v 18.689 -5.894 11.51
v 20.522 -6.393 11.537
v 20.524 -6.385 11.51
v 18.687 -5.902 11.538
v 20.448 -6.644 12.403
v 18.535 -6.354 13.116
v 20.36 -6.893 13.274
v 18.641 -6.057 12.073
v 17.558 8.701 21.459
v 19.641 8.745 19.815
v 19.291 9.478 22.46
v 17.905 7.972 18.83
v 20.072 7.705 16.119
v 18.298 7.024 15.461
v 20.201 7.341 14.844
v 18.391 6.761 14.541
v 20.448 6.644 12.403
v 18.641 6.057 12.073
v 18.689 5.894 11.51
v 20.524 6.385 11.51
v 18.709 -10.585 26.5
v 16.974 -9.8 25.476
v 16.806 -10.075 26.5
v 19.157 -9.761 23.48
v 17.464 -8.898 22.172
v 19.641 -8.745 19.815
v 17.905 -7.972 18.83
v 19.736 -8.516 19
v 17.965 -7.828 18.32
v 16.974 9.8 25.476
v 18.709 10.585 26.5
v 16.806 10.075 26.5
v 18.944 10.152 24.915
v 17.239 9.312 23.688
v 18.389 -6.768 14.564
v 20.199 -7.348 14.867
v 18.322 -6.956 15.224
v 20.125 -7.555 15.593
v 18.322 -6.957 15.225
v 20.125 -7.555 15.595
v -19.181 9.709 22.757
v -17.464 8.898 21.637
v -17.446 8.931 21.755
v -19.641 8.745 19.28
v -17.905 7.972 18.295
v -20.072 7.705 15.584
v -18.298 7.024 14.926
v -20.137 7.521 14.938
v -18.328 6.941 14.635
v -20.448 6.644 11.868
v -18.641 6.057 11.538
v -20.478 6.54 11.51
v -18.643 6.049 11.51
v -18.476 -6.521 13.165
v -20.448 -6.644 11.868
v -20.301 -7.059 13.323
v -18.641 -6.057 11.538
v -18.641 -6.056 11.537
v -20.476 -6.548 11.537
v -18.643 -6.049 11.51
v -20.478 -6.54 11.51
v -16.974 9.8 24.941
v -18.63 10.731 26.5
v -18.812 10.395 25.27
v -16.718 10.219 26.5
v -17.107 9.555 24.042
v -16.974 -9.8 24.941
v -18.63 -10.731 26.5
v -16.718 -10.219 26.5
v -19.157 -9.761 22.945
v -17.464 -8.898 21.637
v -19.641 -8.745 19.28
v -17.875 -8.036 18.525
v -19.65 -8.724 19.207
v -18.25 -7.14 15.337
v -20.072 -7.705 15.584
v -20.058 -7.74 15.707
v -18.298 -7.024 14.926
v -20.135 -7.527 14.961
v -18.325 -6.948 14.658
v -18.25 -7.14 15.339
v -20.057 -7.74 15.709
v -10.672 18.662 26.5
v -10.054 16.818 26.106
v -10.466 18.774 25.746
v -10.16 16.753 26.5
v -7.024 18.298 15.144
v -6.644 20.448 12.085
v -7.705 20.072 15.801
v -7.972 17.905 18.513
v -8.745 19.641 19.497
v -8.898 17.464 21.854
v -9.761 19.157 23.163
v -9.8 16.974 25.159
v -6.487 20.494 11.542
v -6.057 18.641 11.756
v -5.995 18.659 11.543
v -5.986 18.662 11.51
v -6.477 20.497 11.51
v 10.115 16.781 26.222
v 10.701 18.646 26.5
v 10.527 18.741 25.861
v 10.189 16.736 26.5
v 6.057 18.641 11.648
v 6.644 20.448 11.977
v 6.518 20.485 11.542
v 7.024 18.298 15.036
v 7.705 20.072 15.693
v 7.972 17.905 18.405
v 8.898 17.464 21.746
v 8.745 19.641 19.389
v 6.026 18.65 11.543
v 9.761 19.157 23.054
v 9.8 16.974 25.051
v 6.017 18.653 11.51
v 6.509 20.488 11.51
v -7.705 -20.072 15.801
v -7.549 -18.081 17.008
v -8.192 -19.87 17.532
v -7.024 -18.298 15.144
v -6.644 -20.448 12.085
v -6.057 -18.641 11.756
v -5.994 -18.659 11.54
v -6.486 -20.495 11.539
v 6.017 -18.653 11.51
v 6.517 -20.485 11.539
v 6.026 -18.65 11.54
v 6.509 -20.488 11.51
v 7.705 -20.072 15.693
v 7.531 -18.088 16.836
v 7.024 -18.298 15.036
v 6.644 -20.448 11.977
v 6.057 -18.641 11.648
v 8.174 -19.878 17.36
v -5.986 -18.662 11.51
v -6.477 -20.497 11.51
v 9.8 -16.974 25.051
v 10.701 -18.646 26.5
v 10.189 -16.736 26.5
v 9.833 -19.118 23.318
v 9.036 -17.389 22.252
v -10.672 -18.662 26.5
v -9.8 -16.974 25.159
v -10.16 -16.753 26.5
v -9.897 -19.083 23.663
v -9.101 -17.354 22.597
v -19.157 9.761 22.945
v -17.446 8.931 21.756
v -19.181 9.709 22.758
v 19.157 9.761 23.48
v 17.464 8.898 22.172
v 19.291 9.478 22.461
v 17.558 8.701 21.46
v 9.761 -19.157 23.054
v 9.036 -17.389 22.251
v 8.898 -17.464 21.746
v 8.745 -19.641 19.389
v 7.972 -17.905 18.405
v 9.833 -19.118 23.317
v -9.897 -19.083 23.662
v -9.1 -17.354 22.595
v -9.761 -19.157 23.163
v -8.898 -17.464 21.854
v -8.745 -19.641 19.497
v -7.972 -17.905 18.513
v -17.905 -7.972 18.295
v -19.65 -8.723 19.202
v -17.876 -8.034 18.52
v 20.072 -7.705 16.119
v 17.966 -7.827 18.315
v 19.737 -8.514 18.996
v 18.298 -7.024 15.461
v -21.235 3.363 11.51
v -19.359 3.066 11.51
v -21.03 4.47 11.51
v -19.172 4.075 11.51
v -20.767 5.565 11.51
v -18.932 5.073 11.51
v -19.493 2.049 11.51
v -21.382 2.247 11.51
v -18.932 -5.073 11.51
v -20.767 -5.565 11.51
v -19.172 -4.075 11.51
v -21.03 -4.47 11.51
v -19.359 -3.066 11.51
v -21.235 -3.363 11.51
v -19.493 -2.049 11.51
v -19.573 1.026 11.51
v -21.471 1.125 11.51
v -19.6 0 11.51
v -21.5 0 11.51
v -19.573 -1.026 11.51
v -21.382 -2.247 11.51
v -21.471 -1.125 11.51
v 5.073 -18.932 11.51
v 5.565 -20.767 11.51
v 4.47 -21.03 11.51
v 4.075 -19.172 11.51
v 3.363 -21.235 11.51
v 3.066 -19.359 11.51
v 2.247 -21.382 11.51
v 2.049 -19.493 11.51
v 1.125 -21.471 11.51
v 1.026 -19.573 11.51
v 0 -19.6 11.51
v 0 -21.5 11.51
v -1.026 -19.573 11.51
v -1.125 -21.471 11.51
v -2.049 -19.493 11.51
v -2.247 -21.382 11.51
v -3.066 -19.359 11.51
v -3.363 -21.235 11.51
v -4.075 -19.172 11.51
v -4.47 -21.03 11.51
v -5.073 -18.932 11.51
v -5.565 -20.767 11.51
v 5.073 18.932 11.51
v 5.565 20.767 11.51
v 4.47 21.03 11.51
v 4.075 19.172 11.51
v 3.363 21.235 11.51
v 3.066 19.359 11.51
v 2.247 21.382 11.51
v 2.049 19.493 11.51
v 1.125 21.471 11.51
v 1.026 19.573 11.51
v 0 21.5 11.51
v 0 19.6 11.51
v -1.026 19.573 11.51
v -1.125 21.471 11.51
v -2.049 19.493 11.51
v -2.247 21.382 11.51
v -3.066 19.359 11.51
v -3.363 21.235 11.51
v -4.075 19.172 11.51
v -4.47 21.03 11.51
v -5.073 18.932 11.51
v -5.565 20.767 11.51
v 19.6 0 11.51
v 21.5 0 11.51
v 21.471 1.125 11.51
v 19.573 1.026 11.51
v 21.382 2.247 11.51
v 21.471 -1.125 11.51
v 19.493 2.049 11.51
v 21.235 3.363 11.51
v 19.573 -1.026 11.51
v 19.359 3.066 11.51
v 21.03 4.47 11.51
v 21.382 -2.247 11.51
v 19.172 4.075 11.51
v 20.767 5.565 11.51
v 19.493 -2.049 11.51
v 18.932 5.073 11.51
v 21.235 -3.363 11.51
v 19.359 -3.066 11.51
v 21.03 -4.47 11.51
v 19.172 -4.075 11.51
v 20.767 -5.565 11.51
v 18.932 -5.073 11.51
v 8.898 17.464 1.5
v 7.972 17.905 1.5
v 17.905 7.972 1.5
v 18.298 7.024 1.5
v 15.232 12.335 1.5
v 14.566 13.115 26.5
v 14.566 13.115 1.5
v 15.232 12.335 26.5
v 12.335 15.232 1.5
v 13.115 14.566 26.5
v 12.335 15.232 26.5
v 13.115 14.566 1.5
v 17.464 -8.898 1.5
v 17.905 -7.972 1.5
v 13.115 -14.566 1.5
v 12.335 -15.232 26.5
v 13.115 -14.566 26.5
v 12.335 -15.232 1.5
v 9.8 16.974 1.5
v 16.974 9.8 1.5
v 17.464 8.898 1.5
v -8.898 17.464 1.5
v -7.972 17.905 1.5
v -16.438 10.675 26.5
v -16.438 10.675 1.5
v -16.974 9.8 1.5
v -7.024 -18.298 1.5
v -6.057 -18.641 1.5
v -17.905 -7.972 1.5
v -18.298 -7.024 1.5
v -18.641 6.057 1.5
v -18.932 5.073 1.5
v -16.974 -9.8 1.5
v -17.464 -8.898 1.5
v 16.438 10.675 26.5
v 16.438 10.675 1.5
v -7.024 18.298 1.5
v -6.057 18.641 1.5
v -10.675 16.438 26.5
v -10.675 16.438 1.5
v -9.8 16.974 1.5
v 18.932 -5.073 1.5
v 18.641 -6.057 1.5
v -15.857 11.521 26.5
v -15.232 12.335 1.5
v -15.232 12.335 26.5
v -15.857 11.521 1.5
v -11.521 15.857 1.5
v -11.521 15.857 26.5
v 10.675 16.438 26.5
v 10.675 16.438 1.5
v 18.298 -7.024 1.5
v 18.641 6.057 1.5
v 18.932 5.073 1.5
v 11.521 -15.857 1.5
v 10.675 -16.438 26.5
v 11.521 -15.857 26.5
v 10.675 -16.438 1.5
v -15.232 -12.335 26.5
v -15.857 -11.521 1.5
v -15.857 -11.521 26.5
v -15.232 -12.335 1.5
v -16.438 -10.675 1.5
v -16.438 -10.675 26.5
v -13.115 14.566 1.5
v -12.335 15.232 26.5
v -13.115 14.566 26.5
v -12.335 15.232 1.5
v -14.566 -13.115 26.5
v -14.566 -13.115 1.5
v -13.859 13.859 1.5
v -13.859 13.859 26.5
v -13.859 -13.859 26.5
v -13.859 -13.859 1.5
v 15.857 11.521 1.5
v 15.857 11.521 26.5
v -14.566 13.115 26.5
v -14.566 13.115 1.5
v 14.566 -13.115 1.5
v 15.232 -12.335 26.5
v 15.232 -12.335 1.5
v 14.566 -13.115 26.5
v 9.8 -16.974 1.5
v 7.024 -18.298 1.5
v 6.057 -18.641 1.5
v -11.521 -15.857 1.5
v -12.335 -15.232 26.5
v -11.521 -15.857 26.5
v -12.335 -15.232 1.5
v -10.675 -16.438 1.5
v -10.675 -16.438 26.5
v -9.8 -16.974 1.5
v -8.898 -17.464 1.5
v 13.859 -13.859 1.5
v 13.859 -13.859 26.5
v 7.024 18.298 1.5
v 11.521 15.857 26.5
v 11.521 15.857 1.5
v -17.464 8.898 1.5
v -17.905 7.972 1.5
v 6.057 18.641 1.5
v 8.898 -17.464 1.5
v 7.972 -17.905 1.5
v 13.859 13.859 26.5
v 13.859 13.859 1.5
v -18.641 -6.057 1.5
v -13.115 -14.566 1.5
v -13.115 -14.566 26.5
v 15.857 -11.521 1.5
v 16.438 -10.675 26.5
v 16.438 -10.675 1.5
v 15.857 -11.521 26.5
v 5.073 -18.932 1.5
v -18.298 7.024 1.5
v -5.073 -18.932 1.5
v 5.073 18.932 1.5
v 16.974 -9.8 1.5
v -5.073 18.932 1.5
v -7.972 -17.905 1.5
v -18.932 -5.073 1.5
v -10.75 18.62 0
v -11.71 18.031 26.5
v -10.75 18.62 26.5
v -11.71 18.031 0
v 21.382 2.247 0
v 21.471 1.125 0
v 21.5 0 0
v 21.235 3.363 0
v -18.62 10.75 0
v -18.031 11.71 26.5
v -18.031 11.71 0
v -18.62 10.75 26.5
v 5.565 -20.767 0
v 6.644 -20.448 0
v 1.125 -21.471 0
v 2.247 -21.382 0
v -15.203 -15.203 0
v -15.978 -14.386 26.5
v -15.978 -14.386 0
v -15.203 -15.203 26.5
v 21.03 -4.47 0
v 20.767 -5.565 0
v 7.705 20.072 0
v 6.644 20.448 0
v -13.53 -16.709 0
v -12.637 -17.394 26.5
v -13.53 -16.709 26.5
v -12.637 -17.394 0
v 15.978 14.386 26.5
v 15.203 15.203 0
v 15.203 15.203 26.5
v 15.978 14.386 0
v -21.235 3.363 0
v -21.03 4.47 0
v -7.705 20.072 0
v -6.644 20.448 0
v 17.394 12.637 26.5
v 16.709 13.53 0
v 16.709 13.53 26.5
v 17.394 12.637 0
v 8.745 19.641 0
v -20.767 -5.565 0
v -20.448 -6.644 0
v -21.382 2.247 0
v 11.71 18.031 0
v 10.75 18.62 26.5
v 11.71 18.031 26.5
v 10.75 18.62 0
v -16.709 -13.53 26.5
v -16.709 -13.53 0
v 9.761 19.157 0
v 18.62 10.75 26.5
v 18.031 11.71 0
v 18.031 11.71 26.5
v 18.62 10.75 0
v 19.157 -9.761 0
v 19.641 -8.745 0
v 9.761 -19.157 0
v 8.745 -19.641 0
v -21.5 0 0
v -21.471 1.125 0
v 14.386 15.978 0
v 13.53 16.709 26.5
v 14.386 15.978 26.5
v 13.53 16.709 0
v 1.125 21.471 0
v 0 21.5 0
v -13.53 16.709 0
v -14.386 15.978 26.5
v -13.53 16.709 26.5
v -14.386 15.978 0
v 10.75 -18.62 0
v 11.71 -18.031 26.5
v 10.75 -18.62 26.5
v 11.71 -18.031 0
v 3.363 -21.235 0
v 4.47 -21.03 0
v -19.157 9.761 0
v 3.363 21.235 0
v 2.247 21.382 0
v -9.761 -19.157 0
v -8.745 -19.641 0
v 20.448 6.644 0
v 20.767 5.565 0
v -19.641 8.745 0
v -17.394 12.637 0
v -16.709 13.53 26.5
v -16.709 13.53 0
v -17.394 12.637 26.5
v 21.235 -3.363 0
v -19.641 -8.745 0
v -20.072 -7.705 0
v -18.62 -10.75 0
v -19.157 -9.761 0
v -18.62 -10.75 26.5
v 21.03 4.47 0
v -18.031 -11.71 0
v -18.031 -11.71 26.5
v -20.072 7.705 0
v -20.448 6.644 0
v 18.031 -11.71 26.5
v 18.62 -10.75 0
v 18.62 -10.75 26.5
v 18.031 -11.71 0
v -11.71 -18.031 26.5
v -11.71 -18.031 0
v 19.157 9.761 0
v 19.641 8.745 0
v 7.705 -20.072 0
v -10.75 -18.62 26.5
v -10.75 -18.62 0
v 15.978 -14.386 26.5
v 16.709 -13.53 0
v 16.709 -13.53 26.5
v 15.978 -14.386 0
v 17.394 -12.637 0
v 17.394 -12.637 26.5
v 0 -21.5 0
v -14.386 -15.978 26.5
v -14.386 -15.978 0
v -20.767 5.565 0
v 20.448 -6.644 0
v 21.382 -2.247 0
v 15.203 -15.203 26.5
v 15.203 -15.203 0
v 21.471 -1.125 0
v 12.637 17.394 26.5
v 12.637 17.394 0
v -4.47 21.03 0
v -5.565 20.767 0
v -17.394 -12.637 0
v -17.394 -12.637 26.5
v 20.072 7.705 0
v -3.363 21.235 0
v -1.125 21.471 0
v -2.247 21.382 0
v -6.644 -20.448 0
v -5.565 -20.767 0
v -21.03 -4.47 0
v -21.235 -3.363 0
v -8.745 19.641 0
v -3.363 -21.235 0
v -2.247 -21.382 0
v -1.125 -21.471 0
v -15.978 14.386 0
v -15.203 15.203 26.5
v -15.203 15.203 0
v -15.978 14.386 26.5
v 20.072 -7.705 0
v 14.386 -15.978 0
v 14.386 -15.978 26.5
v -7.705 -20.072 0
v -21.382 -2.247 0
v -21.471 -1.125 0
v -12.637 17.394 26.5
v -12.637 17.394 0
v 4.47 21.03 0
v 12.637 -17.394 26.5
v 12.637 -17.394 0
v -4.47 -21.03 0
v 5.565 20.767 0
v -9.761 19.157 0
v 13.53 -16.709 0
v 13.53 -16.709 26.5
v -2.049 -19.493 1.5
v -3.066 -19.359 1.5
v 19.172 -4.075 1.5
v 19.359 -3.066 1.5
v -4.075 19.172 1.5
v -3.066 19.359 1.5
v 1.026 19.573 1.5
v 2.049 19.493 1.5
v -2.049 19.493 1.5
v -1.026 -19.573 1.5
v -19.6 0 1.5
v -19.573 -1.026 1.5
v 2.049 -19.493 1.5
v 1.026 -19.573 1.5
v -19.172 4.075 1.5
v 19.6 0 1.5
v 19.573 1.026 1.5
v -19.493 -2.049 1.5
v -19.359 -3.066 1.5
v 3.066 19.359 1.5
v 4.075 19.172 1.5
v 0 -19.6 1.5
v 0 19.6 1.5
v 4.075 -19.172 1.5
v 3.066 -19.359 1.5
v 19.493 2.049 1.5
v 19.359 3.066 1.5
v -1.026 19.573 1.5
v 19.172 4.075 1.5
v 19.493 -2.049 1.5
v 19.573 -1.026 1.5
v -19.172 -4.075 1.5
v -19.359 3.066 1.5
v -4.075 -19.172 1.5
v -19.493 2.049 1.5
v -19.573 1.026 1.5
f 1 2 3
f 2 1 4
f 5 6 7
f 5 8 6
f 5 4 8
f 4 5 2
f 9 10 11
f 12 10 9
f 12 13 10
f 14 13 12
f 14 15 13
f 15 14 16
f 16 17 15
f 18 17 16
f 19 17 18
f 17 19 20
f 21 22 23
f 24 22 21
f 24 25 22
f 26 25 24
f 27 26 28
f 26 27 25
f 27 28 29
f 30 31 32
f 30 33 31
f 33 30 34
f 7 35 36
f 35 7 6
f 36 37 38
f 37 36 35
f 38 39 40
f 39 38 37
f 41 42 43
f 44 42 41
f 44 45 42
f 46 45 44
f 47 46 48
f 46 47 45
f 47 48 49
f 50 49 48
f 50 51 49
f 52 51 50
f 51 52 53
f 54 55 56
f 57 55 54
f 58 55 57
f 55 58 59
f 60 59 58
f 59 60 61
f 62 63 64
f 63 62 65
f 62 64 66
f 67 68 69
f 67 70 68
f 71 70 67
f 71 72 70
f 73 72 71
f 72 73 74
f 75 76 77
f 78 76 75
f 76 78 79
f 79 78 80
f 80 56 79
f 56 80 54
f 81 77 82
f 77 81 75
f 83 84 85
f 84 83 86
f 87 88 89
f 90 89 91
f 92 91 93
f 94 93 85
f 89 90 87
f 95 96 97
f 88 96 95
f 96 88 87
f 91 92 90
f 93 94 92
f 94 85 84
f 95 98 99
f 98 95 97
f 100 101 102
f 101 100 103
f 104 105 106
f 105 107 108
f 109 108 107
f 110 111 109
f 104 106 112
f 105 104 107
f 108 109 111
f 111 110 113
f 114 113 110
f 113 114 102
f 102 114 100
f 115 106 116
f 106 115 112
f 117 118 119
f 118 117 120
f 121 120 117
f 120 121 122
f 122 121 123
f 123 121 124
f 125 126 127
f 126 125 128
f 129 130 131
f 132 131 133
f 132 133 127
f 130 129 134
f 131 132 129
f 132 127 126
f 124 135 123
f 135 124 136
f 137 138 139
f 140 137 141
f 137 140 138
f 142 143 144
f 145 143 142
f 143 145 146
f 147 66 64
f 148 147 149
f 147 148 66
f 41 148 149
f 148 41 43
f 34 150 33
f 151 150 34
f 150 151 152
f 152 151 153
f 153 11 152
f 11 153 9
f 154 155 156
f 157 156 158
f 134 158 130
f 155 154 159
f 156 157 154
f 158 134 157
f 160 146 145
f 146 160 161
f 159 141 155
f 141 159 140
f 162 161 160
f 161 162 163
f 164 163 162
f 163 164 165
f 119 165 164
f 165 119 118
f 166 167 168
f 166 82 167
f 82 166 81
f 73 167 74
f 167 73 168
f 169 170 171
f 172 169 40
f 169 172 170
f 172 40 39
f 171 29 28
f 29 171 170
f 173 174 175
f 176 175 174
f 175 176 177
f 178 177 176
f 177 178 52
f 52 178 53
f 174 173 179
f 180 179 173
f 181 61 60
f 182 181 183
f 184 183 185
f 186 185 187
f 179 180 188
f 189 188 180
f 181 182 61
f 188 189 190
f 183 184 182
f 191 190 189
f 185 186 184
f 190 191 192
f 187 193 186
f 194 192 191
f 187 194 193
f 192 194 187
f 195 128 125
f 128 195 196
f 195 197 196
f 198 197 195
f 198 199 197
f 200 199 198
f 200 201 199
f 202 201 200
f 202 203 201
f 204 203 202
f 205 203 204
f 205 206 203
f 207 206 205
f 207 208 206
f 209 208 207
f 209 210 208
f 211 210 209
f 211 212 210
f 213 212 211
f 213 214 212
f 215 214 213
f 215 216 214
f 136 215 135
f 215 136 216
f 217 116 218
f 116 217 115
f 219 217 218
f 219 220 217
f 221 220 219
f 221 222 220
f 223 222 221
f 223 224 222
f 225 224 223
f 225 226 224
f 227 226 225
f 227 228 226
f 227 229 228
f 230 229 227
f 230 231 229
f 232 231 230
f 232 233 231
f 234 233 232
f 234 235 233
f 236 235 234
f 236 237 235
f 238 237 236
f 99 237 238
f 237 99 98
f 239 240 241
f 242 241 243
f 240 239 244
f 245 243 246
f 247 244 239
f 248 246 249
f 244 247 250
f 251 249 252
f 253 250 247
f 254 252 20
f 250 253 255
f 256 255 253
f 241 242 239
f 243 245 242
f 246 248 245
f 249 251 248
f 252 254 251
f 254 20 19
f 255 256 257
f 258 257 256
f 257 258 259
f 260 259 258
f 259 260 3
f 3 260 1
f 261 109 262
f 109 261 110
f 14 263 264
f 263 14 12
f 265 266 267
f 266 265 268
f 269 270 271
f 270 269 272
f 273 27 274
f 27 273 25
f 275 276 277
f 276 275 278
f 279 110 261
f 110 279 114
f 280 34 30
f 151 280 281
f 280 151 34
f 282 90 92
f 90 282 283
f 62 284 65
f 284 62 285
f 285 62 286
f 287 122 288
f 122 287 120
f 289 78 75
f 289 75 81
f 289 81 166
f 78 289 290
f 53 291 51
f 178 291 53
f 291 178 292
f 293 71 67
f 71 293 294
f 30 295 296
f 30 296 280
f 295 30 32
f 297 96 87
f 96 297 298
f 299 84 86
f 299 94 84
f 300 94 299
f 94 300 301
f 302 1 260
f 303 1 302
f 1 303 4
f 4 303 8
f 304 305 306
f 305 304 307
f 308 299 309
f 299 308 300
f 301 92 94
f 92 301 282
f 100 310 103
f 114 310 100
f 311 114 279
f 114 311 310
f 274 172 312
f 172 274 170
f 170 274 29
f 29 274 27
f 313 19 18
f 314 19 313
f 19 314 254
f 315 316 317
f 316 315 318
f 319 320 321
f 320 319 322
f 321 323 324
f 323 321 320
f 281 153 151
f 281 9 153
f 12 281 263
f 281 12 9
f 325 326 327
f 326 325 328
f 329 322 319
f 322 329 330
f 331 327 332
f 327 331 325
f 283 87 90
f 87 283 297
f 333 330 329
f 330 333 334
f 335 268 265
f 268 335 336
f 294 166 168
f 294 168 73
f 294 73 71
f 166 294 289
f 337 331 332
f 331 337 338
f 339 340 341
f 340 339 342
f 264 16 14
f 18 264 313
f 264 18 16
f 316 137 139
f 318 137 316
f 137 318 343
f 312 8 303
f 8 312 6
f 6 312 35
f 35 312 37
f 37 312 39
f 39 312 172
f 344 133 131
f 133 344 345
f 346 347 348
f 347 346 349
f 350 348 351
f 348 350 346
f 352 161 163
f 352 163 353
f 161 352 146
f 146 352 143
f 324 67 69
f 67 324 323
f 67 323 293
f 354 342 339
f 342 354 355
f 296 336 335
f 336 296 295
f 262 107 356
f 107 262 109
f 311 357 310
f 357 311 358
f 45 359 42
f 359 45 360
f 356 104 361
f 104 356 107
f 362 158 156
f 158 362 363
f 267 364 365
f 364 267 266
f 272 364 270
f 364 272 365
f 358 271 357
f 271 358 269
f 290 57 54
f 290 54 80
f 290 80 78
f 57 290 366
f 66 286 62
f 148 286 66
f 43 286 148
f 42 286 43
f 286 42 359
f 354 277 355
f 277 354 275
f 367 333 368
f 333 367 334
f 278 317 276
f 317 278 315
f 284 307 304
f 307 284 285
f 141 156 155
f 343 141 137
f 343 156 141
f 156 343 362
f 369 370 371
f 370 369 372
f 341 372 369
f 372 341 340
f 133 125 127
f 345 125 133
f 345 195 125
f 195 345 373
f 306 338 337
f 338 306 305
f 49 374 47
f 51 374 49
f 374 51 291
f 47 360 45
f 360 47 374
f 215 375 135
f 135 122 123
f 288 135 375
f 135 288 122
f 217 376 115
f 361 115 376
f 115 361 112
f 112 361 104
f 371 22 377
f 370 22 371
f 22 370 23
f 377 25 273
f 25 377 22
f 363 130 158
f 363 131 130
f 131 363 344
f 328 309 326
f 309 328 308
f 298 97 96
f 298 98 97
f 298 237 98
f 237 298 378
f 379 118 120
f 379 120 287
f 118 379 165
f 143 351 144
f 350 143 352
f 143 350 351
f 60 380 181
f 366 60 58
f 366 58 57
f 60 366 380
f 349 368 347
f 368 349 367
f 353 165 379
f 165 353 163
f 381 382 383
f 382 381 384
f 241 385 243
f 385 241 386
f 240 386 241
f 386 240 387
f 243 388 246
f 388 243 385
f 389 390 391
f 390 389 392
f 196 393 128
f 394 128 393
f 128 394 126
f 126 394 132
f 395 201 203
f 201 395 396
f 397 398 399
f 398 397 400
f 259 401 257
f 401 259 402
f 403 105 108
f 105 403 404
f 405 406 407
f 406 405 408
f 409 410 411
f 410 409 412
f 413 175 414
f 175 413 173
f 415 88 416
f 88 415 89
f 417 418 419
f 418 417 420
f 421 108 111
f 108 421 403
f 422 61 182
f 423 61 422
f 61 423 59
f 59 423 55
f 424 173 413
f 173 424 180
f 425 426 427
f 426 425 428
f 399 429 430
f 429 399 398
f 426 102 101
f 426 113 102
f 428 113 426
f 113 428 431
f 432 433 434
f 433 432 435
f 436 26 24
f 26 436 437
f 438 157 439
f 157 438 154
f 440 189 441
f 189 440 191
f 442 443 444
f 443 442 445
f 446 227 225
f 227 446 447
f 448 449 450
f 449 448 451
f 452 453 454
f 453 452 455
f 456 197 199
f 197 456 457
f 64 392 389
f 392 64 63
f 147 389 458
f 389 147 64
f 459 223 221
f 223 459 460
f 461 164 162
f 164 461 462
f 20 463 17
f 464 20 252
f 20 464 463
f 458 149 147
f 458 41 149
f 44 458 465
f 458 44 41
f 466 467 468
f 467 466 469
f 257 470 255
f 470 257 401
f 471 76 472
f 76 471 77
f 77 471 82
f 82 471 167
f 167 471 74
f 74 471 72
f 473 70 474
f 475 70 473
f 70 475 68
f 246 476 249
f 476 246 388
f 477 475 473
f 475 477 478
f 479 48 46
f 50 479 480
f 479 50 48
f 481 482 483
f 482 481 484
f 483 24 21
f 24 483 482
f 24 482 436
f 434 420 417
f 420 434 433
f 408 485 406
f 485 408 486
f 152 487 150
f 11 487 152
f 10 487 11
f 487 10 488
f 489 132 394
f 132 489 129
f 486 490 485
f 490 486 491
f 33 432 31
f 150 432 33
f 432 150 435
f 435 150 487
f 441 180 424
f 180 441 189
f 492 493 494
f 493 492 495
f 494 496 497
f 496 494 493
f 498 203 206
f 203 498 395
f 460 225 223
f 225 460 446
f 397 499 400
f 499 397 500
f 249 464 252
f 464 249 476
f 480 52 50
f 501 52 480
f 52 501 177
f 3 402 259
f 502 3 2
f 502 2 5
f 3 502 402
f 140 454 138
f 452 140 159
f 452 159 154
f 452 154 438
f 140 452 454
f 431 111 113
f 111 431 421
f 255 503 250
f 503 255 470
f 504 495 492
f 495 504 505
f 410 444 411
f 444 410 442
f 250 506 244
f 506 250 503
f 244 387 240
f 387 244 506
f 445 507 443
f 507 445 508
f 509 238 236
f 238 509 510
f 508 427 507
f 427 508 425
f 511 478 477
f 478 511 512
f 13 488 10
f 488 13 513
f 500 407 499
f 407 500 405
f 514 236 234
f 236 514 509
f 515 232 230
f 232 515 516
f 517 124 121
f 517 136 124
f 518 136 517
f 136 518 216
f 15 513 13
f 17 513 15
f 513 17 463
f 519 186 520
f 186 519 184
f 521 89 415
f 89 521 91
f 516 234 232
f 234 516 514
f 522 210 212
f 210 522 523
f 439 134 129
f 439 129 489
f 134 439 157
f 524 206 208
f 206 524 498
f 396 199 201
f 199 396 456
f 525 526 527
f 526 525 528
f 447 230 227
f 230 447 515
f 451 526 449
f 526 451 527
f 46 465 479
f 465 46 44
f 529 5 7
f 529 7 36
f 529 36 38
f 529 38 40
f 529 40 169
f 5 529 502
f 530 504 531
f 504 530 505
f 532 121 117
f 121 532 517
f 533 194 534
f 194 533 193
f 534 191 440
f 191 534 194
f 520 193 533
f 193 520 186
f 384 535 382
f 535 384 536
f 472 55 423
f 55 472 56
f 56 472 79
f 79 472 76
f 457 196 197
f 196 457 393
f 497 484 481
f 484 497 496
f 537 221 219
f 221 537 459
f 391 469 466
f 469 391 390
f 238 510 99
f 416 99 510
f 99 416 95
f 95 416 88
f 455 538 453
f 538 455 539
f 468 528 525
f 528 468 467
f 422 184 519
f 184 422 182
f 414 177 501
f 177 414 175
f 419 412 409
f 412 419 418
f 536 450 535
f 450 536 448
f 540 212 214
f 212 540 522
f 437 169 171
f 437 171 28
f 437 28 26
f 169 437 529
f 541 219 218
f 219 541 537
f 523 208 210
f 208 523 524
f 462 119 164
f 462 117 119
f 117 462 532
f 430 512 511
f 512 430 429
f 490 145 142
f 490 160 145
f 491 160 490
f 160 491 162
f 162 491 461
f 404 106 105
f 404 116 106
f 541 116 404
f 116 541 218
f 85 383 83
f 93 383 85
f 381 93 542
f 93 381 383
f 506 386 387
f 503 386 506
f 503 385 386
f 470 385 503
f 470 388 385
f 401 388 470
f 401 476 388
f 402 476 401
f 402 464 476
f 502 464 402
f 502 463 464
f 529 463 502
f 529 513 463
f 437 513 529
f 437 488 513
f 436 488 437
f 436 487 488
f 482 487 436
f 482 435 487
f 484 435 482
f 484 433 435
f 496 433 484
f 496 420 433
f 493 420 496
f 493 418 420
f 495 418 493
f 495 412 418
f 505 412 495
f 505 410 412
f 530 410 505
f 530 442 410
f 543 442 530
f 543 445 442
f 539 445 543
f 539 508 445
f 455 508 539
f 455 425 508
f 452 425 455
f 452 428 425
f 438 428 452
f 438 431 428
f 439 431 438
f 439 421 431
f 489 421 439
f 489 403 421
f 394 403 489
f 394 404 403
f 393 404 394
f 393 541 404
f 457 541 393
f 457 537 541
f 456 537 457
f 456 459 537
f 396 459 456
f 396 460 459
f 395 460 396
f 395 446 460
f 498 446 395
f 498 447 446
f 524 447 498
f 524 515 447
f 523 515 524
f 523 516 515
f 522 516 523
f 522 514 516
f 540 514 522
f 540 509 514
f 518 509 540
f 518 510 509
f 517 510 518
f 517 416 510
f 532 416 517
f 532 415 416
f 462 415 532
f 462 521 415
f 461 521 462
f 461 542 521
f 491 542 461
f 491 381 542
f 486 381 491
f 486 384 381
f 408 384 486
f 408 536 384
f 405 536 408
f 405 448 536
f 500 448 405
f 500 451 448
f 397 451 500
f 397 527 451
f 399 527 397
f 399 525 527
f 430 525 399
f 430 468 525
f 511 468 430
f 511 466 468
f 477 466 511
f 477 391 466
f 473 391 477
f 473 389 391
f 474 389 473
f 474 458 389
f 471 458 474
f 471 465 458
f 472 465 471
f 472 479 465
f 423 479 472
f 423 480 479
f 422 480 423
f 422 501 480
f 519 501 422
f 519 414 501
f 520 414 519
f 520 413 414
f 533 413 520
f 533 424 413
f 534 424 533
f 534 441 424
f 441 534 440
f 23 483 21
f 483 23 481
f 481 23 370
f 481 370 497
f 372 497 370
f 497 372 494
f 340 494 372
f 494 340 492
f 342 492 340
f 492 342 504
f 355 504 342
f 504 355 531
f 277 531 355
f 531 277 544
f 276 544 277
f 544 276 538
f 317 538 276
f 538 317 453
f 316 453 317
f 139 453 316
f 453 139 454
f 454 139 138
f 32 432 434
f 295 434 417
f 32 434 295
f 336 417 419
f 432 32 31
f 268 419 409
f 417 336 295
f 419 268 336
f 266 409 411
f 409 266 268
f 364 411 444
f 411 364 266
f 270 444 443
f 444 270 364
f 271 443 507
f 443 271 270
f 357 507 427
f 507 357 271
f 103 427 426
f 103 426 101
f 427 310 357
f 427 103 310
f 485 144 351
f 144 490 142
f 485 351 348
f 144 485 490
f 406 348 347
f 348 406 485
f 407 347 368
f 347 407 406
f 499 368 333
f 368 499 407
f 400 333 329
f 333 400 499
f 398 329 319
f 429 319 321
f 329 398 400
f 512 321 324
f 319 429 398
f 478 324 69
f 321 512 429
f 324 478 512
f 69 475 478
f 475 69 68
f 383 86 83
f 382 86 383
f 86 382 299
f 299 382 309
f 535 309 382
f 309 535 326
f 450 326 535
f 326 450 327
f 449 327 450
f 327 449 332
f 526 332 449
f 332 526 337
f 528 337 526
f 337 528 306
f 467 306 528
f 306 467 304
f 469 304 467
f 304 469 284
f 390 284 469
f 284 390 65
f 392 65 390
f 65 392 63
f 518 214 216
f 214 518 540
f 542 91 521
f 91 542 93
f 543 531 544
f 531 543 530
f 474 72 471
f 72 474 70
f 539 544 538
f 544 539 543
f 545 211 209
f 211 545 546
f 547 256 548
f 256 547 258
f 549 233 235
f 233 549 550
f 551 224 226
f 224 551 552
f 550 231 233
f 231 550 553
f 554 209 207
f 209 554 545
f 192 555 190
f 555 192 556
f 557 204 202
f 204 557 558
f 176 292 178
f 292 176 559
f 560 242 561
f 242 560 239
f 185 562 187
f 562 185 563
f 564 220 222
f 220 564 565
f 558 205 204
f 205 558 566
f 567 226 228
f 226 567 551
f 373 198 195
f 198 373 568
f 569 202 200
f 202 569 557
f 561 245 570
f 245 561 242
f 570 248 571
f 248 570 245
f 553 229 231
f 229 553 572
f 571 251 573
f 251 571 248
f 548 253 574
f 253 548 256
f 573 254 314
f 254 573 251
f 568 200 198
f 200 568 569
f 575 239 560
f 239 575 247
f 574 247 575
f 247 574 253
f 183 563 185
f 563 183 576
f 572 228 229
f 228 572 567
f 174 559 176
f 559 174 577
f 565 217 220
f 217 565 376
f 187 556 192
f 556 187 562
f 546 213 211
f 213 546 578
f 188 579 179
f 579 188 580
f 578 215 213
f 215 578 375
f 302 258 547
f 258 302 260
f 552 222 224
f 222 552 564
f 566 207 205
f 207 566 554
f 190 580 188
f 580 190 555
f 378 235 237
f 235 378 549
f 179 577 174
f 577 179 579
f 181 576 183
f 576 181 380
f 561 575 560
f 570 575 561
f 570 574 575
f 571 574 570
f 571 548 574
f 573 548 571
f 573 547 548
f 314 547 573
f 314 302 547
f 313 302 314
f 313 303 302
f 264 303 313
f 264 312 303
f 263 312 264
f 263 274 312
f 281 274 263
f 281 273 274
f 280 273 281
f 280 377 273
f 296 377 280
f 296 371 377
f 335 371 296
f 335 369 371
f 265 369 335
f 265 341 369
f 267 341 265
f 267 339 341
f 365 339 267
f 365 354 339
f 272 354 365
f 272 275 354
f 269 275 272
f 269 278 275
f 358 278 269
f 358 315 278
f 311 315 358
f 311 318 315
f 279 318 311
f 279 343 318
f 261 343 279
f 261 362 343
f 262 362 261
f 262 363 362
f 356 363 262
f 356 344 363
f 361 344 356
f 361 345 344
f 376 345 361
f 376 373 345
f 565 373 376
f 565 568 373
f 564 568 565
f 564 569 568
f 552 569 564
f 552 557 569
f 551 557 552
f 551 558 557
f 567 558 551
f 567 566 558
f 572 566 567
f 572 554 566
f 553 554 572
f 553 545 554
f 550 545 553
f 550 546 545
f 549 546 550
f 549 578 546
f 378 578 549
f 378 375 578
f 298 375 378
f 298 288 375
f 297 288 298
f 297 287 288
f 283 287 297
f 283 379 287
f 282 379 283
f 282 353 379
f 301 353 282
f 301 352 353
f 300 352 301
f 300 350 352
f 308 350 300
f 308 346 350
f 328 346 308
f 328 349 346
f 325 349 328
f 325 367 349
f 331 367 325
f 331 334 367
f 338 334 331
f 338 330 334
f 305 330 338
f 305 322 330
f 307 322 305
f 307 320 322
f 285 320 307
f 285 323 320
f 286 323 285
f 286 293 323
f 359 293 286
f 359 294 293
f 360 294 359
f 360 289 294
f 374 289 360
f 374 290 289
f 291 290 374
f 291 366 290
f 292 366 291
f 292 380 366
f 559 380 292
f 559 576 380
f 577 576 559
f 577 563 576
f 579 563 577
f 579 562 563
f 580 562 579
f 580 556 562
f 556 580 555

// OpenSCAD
// file: shave.scad
// Shave stick holder common code

// Copyright (C) 2023 Embecosm Limited (www.embecosm.com)

// Contributor: Jeremy Bennett <jeremy.bennett@embecosm.com>

// This file is licensed under the Creative Commons Attribution-ShareAlike 3.0
// Unported License. To view a copy of this license, visit
// http://creativecommons.org/licenses/by-sa/3.0/ or send a letter to Creative
// Commons, PO Box 1866, Mountain View, CA 94042, USA.

// A simple holder with cover for Arko shaving soap sticks.  These soap sticks
// are approximately 82mm long and 33mm in diameter.

// Code common to all components

EPS = 0.01;			// Very small value
INF = 100.0;			// Very large value

STICK_D = 35.0;			// Shave stick diameter
STICK_L = 82.0;			// Shave stick length

WALL = 2.0;			// Thickness of the main wall
OUTER_D1 = STICK_D + WALL * 2.0;
OUTER_D2 = OUTER_D1 + WALL * 2.0;

BASE_THICK = 2.0;		// Thickness of base
BASE_H = 15.0;			// Depth of base
BASE_FLANGE_H = 7.0;		// Height of bottom flange
//CAP_H = 85.0;			// Height of cap excl. cap
CAP_H = 25.0;
CAP_THICK = 1.5;		// Thickness of lid

FIN_THICK = 1.2;		// Thickness of a fin
FIN_W = 5.0;			// Maximum width of a fin

SPACE = 0.10;			// Space for overlap

// Derived
STICK_R = STICK_D / 2.0;
OUTER_R1 = OUTER_D1 / 2.0;
OUTER_R2 = OUTER_D2 / 2.0;

// Reflect -1 is the slice pointing up, +1 is the slice pointing down
module slice (reflect = 1.0) {
     difference () {
	  hull () {
	       ang = atan (BASE_H / STICK_R);
	       translate (v = [0, 0, 0])
		    sphere(r = EPS);
	       rotate (a = [0, 0, -22.5 - reflect * 7.5])
		    translate (v = [INF, 0, 0])
		    sphere (r = EPS);
	       rotate (a = [0, 0, 22.5 + reflect *  7.5])
		    translate (v = [INF, 0, 0])
		    sphere (r = EPS);
	       rotate (a = [0, reflect * ang, -22.5 + reflect * 7.5])
		    translate (v = [INF, 0, 0])
		    sphere (r = EPS);
	       rotate (a = [0, reflect * ang, 22.5 - reflect * 7.5])
		    translate (v = [INF, 0, 0])
		    sphere (r = EPS);
	  };
	  translate (v = [0, 0, -reflect * (BASE_H + EPS + INF / 2)])
	       cube (size = [INF * 2.0, INF * 2.0, INF], center = true);
     }
}

module cutout () {
     union () {
	  slice (-1);
	  rotate (a = [0, 0, 90])
	       slice (-1);
	  rotate (a = [0, 0, 180])
	       slice (-1);
	  rotate (a = [0, 0, 270])
	       slice (-1);
     }
}
// main file
// Shave stick holder cap

// Copyright (C) 2023 Embecosm Limited (www.embecosm.com)

// Contributor: Jeremy Bennett <jeremy.bennett@embecosm.com>

// This file is licensed under the Creative Commons Attribution-ShareAlike 3.0
// Unported License. To view a copy of this license, visit
// http://creativecommons.org/licenses/by-sa/3.0/ or send a letter to Creative
// Commons, PO Box 1866, Mountain View, CA 94042, USA.

// A simple holder with cover for Arko shaving soap sticks.  These soap sticks
// are approximately 82mm long and 33mm in diameter.

// Common definitions
include <shave.scad>


module inverse_cutout () {
     cylinder (r = OUTER_R1 + SPACE, h = BASE_H, center = false, $fn = 120);
     difference () {
	  cylinder (r = OUTER_R2 + EPS, h = BASE_H, center = false, $fn = 120);
	  difference () {
	       translate (v = [0, 0, -EPS])
		    cylinder (r = OUTER_R2 + EPS, h = BASE_H + 2 * EPS,
			      center = false, $fn = 120);
	       translate (v = [0, 0, 0])
		    minkowski () {
		         cutout ();
			 // There is a bug in OpenScad with 10 as the multiplier
		         cylinder (r = SPACE * 10.1, h = EPS);
	            }
	  };
     }
}

module cap_rim () {
     difference () {
	  cylinder (r = OUTER_R2, h = CAP_THICK + CAP_H,
		    center = false, $fn = 120);
	  cylinder (r = OUTER_R1 + SPACE, h = CAP_THICK + CAP_H + EPS,
		    center = false, $fn = 120);
	  translate (v = [0, 0, CAP_THICK + CAP_H + EPS - BASE_H])
	       inverse_cutout ();
     };
}

module cap_top () {
     cylinder (r = OUTER_R2, h = CAP_THICK,
		    center = false, $fn = 120);
}

module cap () {
     intersection () {
	  union () {
	       cap_rim ();
	       cap_top ();
	  };
	  translate (v = [0, 0, INF / 2.0])
	       cube (size = [INF, INF, INF], center = true);
     }
}

cap ();
